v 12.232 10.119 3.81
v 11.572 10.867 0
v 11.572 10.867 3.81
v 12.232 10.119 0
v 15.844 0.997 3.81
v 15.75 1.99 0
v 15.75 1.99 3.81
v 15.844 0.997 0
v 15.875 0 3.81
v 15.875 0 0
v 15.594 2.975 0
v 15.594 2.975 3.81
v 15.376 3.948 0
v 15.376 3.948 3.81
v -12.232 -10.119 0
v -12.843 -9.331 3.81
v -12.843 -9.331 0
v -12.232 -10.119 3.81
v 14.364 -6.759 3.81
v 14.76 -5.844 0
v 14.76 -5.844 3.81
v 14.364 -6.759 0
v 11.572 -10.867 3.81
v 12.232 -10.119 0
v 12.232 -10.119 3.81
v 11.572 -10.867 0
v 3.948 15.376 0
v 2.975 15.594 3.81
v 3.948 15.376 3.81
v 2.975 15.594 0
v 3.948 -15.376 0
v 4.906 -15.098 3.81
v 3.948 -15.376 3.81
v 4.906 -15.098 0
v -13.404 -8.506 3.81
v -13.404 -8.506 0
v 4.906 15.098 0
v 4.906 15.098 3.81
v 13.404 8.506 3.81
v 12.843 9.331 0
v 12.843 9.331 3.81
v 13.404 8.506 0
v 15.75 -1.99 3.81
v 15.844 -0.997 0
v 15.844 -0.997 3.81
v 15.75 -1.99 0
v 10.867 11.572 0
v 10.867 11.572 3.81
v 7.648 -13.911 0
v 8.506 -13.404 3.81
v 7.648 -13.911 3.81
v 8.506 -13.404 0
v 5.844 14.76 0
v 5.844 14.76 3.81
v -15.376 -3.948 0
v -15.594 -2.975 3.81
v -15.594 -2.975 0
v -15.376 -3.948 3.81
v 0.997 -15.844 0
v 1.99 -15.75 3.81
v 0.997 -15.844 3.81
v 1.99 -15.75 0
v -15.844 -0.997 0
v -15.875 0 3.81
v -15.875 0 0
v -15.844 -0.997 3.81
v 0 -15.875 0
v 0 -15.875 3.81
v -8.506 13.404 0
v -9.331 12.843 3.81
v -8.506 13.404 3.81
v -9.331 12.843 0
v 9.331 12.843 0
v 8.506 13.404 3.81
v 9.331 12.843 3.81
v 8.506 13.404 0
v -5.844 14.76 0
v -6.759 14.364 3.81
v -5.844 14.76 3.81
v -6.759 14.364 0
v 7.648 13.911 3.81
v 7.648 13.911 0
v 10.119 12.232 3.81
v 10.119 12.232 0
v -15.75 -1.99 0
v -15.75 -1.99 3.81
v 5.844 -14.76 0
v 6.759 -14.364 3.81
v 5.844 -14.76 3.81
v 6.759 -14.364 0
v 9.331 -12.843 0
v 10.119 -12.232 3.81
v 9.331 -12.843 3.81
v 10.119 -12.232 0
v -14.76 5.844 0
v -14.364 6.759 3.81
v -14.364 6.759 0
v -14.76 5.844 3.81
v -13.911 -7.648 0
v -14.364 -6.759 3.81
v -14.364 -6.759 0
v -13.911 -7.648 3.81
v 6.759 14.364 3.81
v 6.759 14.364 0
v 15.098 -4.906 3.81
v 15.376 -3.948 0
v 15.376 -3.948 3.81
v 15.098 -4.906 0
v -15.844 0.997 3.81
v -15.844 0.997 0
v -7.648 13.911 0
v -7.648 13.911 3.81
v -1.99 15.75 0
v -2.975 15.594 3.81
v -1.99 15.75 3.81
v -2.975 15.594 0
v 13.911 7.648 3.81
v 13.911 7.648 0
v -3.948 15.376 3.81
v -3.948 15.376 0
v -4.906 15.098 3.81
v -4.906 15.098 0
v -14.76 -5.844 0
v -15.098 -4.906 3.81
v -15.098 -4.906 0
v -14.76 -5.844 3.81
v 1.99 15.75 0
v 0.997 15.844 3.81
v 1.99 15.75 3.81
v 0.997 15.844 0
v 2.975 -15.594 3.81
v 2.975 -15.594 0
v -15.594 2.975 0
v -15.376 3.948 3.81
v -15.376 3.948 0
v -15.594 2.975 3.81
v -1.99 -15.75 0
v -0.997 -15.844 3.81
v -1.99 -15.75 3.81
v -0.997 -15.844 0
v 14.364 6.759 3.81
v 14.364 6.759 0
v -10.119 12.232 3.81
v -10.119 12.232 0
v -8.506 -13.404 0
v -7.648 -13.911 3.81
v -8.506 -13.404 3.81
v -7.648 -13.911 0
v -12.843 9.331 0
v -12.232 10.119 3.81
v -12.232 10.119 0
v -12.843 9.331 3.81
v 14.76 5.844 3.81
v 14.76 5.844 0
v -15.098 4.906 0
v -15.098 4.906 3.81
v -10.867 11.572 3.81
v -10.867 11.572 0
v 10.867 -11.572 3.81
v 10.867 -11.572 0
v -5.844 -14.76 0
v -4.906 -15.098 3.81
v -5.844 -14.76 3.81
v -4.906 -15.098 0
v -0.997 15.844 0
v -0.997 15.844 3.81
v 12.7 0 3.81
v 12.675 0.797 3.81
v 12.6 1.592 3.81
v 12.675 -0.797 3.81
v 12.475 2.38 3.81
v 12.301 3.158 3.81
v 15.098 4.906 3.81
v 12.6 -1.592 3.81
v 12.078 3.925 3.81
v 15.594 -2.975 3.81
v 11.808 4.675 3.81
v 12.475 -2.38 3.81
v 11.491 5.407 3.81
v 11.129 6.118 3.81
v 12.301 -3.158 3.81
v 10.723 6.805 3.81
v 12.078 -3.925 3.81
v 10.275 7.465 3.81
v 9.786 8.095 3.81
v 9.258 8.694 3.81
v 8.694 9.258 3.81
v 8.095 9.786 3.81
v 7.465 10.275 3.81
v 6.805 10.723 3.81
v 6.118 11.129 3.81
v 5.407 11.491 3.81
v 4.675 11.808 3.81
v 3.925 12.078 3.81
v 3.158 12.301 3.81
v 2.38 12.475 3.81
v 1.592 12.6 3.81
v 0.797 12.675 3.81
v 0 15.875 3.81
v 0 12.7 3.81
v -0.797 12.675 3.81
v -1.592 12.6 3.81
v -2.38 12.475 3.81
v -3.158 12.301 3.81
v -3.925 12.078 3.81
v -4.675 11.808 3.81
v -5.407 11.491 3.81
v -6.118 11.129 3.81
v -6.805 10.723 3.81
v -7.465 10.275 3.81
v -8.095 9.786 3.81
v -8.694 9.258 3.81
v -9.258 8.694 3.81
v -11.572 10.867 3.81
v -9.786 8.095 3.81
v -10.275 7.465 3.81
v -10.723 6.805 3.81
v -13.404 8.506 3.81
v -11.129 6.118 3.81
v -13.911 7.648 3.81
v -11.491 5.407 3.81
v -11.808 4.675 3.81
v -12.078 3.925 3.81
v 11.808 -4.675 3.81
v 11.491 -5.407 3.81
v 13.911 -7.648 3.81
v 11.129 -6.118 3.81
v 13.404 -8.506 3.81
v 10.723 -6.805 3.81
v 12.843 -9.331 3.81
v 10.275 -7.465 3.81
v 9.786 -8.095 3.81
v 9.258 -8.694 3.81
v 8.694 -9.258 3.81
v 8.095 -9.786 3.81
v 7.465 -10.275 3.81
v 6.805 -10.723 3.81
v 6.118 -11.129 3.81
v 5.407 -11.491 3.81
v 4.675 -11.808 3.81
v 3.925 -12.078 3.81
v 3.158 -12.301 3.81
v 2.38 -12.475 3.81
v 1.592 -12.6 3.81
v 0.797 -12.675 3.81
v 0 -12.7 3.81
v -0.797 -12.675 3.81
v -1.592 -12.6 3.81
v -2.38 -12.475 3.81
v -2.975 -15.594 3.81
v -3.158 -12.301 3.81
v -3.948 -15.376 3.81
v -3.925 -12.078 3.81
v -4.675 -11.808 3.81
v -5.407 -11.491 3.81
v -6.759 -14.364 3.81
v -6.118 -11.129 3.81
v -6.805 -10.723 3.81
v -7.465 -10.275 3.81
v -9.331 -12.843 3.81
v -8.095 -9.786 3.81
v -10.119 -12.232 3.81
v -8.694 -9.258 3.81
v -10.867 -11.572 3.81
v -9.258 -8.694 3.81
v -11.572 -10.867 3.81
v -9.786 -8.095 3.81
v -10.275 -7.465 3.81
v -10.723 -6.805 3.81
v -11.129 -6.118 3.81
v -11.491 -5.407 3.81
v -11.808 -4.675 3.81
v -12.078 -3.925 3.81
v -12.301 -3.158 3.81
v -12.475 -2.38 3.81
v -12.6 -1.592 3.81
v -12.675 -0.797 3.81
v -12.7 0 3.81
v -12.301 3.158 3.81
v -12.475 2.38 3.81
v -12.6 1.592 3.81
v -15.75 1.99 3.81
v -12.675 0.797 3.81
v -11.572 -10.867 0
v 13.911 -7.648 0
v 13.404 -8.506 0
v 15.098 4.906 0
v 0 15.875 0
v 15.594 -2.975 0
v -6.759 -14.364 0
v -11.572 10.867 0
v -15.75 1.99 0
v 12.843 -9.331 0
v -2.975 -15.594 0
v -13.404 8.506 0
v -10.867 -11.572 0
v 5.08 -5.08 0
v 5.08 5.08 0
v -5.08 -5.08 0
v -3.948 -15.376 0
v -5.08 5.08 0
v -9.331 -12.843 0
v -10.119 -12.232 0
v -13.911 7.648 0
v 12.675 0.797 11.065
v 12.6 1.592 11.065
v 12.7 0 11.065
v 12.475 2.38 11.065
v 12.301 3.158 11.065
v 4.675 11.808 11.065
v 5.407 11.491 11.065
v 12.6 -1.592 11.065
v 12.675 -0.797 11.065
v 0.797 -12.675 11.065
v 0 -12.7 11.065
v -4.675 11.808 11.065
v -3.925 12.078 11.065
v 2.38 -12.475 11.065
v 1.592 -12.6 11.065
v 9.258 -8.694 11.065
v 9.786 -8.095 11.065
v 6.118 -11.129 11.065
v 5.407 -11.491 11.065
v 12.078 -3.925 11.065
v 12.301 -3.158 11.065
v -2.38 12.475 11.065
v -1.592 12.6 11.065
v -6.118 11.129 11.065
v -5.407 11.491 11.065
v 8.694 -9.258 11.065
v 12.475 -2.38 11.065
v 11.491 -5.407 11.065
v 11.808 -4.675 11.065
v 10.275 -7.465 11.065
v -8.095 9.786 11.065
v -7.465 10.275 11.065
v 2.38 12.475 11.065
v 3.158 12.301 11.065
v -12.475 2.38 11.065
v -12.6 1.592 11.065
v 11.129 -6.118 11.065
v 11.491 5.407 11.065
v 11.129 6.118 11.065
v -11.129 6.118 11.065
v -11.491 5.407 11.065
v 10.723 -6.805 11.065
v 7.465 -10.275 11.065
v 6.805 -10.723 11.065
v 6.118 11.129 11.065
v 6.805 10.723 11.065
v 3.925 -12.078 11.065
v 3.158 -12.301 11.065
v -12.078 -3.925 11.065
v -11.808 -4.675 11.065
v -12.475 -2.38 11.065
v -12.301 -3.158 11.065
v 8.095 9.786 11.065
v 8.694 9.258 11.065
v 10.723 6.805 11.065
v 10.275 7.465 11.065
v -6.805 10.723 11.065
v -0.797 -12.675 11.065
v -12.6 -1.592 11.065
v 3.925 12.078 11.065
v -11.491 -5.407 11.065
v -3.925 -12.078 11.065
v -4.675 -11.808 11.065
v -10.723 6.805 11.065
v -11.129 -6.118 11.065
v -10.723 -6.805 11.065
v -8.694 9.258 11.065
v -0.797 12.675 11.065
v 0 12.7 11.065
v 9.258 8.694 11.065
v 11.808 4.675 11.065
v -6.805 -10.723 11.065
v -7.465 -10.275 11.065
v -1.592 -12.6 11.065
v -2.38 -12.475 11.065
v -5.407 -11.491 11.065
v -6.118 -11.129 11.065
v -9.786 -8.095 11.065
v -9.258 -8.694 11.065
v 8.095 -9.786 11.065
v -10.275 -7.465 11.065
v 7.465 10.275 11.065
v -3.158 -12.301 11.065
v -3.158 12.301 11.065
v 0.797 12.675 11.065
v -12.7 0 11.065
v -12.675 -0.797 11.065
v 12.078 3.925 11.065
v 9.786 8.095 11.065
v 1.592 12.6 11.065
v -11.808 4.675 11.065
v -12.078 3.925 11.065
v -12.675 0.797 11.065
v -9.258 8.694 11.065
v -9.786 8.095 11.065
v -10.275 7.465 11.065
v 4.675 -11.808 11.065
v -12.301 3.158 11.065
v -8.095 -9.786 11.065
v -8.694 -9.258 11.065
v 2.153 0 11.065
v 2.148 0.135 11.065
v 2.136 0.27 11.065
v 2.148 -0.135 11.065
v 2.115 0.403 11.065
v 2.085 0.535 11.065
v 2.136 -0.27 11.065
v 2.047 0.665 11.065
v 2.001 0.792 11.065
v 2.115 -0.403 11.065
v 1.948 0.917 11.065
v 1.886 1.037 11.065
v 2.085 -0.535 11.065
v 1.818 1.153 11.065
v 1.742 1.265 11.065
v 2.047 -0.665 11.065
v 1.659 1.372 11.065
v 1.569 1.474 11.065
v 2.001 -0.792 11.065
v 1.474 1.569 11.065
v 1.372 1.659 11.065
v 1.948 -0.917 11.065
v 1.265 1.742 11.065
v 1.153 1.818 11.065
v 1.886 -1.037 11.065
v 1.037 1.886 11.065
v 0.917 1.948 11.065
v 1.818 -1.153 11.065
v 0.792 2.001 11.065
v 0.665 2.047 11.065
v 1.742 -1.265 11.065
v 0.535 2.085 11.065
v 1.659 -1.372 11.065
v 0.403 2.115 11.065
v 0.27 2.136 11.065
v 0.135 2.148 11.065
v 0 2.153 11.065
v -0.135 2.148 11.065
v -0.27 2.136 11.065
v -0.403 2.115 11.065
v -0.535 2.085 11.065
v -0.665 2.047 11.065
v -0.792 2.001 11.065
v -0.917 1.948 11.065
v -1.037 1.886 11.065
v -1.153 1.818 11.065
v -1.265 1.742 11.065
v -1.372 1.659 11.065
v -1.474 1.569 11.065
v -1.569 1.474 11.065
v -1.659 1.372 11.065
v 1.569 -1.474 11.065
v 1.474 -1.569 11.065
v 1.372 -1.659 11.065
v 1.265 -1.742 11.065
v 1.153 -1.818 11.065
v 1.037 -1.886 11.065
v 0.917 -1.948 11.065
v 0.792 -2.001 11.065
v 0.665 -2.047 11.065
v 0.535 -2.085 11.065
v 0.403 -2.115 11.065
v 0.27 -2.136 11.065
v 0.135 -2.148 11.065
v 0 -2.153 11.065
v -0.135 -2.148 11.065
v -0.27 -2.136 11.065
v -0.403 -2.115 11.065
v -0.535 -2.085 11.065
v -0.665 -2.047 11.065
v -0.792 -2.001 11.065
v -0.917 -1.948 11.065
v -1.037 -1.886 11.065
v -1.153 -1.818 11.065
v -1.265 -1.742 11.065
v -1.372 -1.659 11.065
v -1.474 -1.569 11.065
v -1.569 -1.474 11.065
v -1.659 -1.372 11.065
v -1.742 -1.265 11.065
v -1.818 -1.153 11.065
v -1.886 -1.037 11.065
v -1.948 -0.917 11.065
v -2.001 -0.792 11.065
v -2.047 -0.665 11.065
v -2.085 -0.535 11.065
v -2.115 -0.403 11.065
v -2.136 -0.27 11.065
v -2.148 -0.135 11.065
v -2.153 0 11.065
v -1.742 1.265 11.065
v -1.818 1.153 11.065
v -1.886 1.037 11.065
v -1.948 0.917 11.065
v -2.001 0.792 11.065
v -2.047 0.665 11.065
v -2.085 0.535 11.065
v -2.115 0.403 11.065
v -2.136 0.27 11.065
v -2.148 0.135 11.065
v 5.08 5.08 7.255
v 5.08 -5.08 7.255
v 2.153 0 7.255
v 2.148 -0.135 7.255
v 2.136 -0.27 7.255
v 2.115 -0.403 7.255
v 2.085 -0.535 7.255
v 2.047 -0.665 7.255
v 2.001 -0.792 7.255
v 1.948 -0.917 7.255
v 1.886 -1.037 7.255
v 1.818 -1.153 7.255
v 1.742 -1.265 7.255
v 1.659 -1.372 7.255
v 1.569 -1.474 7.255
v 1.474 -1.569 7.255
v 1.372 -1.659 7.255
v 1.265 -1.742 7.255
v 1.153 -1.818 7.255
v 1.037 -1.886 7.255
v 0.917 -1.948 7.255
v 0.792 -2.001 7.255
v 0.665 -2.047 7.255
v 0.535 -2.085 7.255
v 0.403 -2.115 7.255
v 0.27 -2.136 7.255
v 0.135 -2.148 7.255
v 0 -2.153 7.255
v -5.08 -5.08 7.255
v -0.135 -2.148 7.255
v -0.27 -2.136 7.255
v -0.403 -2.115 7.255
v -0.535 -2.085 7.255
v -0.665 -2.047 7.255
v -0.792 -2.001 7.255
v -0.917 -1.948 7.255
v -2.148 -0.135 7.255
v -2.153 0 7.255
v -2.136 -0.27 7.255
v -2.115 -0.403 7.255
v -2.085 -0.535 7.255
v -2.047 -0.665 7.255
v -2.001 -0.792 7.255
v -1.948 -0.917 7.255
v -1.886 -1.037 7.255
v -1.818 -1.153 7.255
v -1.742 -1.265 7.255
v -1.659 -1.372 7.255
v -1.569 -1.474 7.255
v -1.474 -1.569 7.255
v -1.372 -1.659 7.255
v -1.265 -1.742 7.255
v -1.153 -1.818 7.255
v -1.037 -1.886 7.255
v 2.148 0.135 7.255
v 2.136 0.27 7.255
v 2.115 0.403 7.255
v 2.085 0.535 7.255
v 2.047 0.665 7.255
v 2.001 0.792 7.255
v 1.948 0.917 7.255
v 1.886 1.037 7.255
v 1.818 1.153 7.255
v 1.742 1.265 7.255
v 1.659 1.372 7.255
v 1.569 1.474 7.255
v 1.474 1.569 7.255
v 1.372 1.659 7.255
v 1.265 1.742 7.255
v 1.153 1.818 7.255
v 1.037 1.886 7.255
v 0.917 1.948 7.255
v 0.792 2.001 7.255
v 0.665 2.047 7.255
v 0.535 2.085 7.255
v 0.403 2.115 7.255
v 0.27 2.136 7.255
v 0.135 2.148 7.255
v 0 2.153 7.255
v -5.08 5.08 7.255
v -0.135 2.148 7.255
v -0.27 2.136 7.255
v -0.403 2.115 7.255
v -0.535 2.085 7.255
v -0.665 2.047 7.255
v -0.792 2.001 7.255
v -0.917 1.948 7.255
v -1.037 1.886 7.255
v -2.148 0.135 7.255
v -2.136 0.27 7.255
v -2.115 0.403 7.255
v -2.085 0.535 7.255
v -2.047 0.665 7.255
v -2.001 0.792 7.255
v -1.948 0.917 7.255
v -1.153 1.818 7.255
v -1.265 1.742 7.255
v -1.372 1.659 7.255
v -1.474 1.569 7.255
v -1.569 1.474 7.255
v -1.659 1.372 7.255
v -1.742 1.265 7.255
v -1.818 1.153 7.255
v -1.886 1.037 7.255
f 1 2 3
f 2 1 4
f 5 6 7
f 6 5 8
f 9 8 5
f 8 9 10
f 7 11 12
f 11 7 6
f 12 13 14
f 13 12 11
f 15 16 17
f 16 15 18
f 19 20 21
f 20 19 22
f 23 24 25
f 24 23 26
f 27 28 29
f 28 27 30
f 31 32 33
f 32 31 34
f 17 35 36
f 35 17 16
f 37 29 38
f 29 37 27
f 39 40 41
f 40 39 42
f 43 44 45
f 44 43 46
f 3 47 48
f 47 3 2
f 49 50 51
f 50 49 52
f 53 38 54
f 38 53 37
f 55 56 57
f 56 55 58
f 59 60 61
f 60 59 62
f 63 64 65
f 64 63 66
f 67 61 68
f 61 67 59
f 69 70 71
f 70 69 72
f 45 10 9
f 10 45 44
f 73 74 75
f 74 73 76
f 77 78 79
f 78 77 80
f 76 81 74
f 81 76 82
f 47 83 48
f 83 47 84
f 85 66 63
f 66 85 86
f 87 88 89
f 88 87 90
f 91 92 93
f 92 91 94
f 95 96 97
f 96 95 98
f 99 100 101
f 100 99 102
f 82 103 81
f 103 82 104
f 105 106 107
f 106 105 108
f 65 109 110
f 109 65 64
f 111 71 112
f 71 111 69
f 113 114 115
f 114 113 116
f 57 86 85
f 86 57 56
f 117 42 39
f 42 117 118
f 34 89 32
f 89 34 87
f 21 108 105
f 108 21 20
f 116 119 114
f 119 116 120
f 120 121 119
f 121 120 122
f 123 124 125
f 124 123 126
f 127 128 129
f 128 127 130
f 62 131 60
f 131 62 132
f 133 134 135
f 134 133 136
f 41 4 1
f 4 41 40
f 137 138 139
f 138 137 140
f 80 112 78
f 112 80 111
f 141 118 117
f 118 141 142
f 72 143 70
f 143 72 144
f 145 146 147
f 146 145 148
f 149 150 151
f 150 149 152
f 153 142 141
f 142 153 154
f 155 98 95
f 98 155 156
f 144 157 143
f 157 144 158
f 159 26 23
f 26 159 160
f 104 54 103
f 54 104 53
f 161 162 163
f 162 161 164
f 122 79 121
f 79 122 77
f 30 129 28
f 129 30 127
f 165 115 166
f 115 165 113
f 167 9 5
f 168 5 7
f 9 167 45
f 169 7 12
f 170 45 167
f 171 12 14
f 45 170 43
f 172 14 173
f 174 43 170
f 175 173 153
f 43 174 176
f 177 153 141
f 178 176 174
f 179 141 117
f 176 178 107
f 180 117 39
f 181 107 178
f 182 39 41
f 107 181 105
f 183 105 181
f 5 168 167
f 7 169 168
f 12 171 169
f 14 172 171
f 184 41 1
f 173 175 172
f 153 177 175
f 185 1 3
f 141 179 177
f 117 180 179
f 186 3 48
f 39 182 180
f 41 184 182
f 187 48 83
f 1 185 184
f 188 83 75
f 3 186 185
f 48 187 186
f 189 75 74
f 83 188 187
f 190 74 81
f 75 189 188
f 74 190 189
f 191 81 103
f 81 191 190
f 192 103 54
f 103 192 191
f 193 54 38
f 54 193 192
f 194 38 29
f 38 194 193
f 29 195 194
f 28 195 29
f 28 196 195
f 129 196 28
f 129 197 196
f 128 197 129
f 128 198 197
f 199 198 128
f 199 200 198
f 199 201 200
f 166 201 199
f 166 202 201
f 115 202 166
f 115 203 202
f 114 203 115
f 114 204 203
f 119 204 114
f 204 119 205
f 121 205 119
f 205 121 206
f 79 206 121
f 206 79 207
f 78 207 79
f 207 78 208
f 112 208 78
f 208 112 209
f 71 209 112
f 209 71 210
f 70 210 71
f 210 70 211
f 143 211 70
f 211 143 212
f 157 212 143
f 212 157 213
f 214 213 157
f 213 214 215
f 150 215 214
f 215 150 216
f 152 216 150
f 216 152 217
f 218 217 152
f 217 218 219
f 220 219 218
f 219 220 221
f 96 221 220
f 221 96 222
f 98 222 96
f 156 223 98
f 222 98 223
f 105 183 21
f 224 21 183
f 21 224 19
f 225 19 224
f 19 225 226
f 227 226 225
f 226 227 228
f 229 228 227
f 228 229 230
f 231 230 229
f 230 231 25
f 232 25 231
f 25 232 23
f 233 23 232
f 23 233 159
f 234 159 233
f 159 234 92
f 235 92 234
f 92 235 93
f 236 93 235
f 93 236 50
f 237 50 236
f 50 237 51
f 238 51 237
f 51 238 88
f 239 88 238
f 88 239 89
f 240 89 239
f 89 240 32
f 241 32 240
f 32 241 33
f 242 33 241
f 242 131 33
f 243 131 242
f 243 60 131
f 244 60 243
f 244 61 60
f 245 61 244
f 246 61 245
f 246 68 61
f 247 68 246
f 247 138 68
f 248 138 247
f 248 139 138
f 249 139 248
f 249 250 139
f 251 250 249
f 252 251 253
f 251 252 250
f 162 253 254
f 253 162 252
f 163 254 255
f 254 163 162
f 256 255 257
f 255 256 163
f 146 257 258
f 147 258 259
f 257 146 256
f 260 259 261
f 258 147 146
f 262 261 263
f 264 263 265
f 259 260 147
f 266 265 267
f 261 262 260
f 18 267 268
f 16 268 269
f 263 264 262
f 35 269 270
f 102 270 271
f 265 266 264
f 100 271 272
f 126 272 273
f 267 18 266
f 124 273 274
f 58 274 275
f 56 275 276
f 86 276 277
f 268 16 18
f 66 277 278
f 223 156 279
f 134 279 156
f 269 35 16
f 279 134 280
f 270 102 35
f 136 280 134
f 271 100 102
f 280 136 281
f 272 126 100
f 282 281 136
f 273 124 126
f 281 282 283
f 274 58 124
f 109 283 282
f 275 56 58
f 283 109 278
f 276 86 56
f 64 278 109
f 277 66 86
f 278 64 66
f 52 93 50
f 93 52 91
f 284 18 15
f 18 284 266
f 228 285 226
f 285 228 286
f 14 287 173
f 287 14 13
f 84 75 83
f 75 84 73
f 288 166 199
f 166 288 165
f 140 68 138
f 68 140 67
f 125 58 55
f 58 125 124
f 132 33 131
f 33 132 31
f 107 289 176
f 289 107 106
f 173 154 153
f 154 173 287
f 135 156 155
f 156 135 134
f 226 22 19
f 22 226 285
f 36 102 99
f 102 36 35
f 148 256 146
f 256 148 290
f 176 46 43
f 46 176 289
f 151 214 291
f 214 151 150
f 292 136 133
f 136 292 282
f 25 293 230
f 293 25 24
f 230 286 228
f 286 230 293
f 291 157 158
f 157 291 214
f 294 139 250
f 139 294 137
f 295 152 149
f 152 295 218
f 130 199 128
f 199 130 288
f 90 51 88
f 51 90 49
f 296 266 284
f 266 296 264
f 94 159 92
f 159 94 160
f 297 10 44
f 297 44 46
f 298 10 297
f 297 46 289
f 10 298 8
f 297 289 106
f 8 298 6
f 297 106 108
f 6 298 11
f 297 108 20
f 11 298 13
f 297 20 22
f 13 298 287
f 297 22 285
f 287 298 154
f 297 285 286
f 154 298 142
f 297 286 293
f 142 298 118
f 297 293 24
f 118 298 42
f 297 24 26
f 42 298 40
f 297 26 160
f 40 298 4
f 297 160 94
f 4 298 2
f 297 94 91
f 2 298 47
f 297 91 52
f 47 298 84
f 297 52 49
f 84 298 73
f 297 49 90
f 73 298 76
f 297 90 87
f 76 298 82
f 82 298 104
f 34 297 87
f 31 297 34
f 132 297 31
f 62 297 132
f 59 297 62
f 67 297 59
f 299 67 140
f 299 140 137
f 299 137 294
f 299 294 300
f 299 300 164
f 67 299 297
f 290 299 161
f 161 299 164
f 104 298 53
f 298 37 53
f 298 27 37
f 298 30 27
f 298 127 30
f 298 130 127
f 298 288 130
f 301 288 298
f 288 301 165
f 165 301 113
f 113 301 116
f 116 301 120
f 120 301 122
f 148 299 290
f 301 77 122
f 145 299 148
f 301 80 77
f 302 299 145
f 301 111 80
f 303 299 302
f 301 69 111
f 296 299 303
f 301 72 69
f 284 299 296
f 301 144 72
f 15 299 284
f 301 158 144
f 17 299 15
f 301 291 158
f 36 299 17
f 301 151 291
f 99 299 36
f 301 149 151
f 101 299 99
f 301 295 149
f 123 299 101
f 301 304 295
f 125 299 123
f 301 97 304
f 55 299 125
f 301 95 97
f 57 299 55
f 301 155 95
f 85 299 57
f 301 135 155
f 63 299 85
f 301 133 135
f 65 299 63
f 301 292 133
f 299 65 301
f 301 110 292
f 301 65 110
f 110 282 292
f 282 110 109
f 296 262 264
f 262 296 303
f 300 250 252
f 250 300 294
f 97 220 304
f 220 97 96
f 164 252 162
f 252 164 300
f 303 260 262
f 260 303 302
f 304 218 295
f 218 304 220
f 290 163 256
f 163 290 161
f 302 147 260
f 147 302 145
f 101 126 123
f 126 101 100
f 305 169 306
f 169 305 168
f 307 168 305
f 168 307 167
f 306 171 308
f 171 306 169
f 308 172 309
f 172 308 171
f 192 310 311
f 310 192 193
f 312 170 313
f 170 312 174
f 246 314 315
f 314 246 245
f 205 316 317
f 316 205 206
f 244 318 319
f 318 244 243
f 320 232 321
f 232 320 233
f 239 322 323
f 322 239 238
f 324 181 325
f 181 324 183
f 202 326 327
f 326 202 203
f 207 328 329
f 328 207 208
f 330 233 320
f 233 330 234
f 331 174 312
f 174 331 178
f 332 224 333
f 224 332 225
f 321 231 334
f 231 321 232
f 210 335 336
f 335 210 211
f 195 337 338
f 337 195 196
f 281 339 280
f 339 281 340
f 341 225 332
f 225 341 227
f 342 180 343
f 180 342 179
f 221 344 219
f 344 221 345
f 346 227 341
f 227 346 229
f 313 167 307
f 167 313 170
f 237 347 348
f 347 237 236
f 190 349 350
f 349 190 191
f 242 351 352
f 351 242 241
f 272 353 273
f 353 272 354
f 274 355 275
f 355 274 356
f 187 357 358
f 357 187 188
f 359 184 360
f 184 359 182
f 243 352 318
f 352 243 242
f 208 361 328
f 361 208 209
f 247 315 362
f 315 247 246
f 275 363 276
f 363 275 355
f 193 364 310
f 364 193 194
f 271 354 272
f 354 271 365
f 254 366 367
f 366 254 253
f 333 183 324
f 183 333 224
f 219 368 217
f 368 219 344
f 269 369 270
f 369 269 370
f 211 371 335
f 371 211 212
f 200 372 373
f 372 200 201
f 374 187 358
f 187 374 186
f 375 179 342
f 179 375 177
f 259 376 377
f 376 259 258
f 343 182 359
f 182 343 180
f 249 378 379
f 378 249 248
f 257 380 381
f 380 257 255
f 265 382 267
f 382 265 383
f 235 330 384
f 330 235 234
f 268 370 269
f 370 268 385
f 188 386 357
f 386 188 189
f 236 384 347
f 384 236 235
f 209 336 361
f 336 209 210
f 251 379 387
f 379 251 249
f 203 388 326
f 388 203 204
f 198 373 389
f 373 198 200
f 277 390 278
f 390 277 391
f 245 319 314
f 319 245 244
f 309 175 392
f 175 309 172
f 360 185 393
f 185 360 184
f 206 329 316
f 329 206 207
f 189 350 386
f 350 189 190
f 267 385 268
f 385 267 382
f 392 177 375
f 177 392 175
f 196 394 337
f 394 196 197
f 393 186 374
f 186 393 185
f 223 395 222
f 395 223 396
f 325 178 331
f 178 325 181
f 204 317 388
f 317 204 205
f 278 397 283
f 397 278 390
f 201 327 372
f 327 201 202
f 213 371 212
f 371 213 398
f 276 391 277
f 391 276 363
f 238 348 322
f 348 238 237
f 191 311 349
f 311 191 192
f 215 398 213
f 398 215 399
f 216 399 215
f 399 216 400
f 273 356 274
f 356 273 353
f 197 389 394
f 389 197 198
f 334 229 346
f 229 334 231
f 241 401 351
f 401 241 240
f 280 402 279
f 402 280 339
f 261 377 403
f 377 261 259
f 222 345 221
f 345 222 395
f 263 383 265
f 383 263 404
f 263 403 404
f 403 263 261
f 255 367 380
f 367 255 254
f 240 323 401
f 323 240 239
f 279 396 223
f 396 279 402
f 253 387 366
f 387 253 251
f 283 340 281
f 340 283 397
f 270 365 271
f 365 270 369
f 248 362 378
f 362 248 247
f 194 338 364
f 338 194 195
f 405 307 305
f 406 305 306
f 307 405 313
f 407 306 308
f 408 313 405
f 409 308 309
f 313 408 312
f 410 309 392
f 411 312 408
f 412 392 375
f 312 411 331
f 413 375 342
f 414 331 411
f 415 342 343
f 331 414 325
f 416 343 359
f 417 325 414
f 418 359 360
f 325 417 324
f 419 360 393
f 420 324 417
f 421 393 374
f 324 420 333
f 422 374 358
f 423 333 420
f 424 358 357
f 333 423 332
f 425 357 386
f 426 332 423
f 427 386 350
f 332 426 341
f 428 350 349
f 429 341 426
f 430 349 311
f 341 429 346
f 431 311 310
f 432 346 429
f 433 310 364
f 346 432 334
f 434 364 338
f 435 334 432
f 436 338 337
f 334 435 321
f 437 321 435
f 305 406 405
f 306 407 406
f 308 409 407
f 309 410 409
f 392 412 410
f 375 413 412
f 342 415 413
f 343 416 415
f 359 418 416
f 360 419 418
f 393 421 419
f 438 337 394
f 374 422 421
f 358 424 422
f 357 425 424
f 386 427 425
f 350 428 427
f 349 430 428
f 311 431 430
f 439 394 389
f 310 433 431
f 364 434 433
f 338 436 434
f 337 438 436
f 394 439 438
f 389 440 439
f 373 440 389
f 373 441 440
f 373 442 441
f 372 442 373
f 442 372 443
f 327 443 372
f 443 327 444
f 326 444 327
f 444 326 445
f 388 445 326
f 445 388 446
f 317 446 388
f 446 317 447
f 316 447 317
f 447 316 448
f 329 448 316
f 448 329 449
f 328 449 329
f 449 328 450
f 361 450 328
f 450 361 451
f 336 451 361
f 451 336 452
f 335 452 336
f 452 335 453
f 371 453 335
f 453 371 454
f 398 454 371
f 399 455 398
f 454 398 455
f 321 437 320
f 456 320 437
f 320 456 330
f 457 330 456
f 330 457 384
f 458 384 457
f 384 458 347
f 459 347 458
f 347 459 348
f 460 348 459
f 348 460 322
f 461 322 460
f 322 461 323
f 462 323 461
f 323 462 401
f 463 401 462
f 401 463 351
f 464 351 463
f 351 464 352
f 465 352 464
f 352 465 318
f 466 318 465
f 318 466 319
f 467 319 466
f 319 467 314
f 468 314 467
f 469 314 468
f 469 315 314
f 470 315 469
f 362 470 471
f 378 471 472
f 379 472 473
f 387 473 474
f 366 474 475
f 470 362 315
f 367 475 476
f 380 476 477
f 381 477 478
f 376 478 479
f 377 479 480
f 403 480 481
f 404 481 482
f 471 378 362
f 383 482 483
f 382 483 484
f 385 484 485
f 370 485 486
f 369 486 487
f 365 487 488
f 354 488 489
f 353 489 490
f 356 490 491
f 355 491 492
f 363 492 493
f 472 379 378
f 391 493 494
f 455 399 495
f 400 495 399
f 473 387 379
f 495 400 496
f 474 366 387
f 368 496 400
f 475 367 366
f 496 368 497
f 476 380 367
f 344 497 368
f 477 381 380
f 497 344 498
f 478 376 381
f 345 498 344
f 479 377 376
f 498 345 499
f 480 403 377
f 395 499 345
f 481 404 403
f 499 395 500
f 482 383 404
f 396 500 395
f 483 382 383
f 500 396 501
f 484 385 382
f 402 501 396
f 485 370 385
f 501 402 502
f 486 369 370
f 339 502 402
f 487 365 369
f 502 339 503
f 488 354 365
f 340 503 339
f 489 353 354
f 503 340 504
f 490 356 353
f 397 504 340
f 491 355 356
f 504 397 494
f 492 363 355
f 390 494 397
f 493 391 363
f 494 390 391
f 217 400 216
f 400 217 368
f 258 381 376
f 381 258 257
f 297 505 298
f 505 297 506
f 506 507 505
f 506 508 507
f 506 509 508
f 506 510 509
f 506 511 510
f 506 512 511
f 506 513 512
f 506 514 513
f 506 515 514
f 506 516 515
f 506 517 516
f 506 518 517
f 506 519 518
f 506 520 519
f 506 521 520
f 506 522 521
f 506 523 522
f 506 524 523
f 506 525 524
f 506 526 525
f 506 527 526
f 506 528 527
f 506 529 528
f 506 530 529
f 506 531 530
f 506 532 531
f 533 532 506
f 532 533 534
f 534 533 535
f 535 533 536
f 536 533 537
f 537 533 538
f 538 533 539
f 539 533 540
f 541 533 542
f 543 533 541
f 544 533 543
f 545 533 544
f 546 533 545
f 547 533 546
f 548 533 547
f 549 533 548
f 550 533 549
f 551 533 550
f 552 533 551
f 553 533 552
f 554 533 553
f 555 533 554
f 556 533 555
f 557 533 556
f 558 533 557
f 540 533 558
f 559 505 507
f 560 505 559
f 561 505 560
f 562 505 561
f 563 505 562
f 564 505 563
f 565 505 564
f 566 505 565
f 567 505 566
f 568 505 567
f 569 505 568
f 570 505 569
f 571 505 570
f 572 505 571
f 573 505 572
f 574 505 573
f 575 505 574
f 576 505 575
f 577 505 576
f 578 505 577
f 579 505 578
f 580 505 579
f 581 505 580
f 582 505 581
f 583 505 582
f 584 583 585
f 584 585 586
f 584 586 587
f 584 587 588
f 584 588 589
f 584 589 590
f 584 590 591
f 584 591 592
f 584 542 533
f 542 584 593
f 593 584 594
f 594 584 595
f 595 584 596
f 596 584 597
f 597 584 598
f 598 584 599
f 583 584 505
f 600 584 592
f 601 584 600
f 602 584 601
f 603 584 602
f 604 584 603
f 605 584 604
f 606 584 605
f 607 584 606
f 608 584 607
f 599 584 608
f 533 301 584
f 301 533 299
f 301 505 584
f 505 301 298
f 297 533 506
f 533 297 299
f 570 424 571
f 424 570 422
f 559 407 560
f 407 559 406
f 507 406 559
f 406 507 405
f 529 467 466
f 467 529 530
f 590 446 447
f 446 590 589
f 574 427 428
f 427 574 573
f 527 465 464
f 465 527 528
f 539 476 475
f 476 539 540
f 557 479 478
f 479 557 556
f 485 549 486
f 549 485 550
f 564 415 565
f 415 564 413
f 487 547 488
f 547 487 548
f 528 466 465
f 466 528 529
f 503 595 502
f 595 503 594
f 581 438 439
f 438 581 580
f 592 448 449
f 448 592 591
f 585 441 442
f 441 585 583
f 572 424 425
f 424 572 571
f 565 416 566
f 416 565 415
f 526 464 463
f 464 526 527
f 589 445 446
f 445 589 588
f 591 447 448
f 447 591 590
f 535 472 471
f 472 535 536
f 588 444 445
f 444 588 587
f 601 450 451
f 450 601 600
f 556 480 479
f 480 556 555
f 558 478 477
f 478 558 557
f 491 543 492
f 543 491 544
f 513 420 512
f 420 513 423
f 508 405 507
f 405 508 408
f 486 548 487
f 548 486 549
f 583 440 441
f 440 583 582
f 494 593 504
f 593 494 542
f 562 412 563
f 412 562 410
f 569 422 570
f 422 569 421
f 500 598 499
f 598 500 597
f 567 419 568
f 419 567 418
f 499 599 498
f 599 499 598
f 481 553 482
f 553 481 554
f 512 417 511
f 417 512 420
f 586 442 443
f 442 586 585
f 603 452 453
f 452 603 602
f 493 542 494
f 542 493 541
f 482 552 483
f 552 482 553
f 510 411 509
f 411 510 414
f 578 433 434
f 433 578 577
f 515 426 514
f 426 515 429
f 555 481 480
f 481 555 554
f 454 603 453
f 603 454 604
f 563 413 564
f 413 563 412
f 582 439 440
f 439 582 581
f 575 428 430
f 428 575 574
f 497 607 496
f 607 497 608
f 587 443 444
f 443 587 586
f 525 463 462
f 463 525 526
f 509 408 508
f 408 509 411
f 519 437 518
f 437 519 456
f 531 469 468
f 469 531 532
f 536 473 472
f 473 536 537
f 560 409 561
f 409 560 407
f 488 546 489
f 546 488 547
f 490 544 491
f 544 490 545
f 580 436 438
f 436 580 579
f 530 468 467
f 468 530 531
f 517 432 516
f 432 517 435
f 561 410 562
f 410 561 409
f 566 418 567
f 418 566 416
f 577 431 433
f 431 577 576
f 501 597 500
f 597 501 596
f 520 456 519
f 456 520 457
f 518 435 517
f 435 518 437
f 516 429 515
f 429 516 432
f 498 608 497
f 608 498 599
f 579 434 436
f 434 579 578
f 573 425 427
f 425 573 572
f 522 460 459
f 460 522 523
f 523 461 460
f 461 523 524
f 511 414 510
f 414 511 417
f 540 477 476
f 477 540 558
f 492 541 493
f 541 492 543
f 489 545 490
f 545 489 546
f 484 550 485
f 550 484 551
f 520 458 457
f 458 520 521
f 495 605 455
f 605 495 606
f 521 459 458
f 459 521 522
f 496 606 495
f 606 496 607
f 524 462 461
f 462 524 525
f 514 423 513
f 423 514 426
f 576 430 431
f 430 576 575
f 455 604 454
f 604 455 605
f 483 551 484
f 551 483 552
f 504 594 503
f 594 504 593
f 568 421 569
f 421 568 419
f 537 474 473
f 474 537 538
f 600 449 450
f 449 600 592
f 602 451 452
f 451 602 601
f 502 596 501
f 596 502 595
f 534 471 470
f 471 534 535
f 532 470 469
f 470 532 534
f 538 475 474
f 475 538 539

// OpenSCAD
$fn = 100;

function fromInches (i) = i * 25.4;

module squishablePlunger (backPlateHeight, shaftHeight, shaftDiameter, drillSize) {
    difference () {
        union () {
            baseDisk(backPlateHeight);
            translate ([0,0,backPlateHeight]) shaft(shaftHeight-1, shaftDiameter);
        }

        plungerRodHole(
            fromInches(0.4),
            backPlateHeight+shaftHeight-1-fromInches(0.15));

        /* The drill hole */
        cylinder(h = backPlateHeight+shaftHeight, d = drillSize);
    }
}

module baseDisk (height) {
    cylinder(h = height, d = fromInches (1.250));
}

module shaft (height, diameter) {
    cylinder(h = height, d = diameter);
}

module plungerRodHole (width, height) {
    translate ([-1*width/2,-1*width/2, -1])
        cube ([width,width,height+1]);
}

/*
For McMaster-Carr part 9562K46 and matching instructions from
http://nerfhaven.com/forums/topic/25180-rainbow-pistol-write-up/ 
*/

squishablePlunger(
    backPlateHeight = fromInches(0.150),
    shaftHeight = fromInches(0.325),
    shaftDiameter = fromInches(1),
    drillSize = fromInches(0.1695) // For #8 close fit screw
    );
